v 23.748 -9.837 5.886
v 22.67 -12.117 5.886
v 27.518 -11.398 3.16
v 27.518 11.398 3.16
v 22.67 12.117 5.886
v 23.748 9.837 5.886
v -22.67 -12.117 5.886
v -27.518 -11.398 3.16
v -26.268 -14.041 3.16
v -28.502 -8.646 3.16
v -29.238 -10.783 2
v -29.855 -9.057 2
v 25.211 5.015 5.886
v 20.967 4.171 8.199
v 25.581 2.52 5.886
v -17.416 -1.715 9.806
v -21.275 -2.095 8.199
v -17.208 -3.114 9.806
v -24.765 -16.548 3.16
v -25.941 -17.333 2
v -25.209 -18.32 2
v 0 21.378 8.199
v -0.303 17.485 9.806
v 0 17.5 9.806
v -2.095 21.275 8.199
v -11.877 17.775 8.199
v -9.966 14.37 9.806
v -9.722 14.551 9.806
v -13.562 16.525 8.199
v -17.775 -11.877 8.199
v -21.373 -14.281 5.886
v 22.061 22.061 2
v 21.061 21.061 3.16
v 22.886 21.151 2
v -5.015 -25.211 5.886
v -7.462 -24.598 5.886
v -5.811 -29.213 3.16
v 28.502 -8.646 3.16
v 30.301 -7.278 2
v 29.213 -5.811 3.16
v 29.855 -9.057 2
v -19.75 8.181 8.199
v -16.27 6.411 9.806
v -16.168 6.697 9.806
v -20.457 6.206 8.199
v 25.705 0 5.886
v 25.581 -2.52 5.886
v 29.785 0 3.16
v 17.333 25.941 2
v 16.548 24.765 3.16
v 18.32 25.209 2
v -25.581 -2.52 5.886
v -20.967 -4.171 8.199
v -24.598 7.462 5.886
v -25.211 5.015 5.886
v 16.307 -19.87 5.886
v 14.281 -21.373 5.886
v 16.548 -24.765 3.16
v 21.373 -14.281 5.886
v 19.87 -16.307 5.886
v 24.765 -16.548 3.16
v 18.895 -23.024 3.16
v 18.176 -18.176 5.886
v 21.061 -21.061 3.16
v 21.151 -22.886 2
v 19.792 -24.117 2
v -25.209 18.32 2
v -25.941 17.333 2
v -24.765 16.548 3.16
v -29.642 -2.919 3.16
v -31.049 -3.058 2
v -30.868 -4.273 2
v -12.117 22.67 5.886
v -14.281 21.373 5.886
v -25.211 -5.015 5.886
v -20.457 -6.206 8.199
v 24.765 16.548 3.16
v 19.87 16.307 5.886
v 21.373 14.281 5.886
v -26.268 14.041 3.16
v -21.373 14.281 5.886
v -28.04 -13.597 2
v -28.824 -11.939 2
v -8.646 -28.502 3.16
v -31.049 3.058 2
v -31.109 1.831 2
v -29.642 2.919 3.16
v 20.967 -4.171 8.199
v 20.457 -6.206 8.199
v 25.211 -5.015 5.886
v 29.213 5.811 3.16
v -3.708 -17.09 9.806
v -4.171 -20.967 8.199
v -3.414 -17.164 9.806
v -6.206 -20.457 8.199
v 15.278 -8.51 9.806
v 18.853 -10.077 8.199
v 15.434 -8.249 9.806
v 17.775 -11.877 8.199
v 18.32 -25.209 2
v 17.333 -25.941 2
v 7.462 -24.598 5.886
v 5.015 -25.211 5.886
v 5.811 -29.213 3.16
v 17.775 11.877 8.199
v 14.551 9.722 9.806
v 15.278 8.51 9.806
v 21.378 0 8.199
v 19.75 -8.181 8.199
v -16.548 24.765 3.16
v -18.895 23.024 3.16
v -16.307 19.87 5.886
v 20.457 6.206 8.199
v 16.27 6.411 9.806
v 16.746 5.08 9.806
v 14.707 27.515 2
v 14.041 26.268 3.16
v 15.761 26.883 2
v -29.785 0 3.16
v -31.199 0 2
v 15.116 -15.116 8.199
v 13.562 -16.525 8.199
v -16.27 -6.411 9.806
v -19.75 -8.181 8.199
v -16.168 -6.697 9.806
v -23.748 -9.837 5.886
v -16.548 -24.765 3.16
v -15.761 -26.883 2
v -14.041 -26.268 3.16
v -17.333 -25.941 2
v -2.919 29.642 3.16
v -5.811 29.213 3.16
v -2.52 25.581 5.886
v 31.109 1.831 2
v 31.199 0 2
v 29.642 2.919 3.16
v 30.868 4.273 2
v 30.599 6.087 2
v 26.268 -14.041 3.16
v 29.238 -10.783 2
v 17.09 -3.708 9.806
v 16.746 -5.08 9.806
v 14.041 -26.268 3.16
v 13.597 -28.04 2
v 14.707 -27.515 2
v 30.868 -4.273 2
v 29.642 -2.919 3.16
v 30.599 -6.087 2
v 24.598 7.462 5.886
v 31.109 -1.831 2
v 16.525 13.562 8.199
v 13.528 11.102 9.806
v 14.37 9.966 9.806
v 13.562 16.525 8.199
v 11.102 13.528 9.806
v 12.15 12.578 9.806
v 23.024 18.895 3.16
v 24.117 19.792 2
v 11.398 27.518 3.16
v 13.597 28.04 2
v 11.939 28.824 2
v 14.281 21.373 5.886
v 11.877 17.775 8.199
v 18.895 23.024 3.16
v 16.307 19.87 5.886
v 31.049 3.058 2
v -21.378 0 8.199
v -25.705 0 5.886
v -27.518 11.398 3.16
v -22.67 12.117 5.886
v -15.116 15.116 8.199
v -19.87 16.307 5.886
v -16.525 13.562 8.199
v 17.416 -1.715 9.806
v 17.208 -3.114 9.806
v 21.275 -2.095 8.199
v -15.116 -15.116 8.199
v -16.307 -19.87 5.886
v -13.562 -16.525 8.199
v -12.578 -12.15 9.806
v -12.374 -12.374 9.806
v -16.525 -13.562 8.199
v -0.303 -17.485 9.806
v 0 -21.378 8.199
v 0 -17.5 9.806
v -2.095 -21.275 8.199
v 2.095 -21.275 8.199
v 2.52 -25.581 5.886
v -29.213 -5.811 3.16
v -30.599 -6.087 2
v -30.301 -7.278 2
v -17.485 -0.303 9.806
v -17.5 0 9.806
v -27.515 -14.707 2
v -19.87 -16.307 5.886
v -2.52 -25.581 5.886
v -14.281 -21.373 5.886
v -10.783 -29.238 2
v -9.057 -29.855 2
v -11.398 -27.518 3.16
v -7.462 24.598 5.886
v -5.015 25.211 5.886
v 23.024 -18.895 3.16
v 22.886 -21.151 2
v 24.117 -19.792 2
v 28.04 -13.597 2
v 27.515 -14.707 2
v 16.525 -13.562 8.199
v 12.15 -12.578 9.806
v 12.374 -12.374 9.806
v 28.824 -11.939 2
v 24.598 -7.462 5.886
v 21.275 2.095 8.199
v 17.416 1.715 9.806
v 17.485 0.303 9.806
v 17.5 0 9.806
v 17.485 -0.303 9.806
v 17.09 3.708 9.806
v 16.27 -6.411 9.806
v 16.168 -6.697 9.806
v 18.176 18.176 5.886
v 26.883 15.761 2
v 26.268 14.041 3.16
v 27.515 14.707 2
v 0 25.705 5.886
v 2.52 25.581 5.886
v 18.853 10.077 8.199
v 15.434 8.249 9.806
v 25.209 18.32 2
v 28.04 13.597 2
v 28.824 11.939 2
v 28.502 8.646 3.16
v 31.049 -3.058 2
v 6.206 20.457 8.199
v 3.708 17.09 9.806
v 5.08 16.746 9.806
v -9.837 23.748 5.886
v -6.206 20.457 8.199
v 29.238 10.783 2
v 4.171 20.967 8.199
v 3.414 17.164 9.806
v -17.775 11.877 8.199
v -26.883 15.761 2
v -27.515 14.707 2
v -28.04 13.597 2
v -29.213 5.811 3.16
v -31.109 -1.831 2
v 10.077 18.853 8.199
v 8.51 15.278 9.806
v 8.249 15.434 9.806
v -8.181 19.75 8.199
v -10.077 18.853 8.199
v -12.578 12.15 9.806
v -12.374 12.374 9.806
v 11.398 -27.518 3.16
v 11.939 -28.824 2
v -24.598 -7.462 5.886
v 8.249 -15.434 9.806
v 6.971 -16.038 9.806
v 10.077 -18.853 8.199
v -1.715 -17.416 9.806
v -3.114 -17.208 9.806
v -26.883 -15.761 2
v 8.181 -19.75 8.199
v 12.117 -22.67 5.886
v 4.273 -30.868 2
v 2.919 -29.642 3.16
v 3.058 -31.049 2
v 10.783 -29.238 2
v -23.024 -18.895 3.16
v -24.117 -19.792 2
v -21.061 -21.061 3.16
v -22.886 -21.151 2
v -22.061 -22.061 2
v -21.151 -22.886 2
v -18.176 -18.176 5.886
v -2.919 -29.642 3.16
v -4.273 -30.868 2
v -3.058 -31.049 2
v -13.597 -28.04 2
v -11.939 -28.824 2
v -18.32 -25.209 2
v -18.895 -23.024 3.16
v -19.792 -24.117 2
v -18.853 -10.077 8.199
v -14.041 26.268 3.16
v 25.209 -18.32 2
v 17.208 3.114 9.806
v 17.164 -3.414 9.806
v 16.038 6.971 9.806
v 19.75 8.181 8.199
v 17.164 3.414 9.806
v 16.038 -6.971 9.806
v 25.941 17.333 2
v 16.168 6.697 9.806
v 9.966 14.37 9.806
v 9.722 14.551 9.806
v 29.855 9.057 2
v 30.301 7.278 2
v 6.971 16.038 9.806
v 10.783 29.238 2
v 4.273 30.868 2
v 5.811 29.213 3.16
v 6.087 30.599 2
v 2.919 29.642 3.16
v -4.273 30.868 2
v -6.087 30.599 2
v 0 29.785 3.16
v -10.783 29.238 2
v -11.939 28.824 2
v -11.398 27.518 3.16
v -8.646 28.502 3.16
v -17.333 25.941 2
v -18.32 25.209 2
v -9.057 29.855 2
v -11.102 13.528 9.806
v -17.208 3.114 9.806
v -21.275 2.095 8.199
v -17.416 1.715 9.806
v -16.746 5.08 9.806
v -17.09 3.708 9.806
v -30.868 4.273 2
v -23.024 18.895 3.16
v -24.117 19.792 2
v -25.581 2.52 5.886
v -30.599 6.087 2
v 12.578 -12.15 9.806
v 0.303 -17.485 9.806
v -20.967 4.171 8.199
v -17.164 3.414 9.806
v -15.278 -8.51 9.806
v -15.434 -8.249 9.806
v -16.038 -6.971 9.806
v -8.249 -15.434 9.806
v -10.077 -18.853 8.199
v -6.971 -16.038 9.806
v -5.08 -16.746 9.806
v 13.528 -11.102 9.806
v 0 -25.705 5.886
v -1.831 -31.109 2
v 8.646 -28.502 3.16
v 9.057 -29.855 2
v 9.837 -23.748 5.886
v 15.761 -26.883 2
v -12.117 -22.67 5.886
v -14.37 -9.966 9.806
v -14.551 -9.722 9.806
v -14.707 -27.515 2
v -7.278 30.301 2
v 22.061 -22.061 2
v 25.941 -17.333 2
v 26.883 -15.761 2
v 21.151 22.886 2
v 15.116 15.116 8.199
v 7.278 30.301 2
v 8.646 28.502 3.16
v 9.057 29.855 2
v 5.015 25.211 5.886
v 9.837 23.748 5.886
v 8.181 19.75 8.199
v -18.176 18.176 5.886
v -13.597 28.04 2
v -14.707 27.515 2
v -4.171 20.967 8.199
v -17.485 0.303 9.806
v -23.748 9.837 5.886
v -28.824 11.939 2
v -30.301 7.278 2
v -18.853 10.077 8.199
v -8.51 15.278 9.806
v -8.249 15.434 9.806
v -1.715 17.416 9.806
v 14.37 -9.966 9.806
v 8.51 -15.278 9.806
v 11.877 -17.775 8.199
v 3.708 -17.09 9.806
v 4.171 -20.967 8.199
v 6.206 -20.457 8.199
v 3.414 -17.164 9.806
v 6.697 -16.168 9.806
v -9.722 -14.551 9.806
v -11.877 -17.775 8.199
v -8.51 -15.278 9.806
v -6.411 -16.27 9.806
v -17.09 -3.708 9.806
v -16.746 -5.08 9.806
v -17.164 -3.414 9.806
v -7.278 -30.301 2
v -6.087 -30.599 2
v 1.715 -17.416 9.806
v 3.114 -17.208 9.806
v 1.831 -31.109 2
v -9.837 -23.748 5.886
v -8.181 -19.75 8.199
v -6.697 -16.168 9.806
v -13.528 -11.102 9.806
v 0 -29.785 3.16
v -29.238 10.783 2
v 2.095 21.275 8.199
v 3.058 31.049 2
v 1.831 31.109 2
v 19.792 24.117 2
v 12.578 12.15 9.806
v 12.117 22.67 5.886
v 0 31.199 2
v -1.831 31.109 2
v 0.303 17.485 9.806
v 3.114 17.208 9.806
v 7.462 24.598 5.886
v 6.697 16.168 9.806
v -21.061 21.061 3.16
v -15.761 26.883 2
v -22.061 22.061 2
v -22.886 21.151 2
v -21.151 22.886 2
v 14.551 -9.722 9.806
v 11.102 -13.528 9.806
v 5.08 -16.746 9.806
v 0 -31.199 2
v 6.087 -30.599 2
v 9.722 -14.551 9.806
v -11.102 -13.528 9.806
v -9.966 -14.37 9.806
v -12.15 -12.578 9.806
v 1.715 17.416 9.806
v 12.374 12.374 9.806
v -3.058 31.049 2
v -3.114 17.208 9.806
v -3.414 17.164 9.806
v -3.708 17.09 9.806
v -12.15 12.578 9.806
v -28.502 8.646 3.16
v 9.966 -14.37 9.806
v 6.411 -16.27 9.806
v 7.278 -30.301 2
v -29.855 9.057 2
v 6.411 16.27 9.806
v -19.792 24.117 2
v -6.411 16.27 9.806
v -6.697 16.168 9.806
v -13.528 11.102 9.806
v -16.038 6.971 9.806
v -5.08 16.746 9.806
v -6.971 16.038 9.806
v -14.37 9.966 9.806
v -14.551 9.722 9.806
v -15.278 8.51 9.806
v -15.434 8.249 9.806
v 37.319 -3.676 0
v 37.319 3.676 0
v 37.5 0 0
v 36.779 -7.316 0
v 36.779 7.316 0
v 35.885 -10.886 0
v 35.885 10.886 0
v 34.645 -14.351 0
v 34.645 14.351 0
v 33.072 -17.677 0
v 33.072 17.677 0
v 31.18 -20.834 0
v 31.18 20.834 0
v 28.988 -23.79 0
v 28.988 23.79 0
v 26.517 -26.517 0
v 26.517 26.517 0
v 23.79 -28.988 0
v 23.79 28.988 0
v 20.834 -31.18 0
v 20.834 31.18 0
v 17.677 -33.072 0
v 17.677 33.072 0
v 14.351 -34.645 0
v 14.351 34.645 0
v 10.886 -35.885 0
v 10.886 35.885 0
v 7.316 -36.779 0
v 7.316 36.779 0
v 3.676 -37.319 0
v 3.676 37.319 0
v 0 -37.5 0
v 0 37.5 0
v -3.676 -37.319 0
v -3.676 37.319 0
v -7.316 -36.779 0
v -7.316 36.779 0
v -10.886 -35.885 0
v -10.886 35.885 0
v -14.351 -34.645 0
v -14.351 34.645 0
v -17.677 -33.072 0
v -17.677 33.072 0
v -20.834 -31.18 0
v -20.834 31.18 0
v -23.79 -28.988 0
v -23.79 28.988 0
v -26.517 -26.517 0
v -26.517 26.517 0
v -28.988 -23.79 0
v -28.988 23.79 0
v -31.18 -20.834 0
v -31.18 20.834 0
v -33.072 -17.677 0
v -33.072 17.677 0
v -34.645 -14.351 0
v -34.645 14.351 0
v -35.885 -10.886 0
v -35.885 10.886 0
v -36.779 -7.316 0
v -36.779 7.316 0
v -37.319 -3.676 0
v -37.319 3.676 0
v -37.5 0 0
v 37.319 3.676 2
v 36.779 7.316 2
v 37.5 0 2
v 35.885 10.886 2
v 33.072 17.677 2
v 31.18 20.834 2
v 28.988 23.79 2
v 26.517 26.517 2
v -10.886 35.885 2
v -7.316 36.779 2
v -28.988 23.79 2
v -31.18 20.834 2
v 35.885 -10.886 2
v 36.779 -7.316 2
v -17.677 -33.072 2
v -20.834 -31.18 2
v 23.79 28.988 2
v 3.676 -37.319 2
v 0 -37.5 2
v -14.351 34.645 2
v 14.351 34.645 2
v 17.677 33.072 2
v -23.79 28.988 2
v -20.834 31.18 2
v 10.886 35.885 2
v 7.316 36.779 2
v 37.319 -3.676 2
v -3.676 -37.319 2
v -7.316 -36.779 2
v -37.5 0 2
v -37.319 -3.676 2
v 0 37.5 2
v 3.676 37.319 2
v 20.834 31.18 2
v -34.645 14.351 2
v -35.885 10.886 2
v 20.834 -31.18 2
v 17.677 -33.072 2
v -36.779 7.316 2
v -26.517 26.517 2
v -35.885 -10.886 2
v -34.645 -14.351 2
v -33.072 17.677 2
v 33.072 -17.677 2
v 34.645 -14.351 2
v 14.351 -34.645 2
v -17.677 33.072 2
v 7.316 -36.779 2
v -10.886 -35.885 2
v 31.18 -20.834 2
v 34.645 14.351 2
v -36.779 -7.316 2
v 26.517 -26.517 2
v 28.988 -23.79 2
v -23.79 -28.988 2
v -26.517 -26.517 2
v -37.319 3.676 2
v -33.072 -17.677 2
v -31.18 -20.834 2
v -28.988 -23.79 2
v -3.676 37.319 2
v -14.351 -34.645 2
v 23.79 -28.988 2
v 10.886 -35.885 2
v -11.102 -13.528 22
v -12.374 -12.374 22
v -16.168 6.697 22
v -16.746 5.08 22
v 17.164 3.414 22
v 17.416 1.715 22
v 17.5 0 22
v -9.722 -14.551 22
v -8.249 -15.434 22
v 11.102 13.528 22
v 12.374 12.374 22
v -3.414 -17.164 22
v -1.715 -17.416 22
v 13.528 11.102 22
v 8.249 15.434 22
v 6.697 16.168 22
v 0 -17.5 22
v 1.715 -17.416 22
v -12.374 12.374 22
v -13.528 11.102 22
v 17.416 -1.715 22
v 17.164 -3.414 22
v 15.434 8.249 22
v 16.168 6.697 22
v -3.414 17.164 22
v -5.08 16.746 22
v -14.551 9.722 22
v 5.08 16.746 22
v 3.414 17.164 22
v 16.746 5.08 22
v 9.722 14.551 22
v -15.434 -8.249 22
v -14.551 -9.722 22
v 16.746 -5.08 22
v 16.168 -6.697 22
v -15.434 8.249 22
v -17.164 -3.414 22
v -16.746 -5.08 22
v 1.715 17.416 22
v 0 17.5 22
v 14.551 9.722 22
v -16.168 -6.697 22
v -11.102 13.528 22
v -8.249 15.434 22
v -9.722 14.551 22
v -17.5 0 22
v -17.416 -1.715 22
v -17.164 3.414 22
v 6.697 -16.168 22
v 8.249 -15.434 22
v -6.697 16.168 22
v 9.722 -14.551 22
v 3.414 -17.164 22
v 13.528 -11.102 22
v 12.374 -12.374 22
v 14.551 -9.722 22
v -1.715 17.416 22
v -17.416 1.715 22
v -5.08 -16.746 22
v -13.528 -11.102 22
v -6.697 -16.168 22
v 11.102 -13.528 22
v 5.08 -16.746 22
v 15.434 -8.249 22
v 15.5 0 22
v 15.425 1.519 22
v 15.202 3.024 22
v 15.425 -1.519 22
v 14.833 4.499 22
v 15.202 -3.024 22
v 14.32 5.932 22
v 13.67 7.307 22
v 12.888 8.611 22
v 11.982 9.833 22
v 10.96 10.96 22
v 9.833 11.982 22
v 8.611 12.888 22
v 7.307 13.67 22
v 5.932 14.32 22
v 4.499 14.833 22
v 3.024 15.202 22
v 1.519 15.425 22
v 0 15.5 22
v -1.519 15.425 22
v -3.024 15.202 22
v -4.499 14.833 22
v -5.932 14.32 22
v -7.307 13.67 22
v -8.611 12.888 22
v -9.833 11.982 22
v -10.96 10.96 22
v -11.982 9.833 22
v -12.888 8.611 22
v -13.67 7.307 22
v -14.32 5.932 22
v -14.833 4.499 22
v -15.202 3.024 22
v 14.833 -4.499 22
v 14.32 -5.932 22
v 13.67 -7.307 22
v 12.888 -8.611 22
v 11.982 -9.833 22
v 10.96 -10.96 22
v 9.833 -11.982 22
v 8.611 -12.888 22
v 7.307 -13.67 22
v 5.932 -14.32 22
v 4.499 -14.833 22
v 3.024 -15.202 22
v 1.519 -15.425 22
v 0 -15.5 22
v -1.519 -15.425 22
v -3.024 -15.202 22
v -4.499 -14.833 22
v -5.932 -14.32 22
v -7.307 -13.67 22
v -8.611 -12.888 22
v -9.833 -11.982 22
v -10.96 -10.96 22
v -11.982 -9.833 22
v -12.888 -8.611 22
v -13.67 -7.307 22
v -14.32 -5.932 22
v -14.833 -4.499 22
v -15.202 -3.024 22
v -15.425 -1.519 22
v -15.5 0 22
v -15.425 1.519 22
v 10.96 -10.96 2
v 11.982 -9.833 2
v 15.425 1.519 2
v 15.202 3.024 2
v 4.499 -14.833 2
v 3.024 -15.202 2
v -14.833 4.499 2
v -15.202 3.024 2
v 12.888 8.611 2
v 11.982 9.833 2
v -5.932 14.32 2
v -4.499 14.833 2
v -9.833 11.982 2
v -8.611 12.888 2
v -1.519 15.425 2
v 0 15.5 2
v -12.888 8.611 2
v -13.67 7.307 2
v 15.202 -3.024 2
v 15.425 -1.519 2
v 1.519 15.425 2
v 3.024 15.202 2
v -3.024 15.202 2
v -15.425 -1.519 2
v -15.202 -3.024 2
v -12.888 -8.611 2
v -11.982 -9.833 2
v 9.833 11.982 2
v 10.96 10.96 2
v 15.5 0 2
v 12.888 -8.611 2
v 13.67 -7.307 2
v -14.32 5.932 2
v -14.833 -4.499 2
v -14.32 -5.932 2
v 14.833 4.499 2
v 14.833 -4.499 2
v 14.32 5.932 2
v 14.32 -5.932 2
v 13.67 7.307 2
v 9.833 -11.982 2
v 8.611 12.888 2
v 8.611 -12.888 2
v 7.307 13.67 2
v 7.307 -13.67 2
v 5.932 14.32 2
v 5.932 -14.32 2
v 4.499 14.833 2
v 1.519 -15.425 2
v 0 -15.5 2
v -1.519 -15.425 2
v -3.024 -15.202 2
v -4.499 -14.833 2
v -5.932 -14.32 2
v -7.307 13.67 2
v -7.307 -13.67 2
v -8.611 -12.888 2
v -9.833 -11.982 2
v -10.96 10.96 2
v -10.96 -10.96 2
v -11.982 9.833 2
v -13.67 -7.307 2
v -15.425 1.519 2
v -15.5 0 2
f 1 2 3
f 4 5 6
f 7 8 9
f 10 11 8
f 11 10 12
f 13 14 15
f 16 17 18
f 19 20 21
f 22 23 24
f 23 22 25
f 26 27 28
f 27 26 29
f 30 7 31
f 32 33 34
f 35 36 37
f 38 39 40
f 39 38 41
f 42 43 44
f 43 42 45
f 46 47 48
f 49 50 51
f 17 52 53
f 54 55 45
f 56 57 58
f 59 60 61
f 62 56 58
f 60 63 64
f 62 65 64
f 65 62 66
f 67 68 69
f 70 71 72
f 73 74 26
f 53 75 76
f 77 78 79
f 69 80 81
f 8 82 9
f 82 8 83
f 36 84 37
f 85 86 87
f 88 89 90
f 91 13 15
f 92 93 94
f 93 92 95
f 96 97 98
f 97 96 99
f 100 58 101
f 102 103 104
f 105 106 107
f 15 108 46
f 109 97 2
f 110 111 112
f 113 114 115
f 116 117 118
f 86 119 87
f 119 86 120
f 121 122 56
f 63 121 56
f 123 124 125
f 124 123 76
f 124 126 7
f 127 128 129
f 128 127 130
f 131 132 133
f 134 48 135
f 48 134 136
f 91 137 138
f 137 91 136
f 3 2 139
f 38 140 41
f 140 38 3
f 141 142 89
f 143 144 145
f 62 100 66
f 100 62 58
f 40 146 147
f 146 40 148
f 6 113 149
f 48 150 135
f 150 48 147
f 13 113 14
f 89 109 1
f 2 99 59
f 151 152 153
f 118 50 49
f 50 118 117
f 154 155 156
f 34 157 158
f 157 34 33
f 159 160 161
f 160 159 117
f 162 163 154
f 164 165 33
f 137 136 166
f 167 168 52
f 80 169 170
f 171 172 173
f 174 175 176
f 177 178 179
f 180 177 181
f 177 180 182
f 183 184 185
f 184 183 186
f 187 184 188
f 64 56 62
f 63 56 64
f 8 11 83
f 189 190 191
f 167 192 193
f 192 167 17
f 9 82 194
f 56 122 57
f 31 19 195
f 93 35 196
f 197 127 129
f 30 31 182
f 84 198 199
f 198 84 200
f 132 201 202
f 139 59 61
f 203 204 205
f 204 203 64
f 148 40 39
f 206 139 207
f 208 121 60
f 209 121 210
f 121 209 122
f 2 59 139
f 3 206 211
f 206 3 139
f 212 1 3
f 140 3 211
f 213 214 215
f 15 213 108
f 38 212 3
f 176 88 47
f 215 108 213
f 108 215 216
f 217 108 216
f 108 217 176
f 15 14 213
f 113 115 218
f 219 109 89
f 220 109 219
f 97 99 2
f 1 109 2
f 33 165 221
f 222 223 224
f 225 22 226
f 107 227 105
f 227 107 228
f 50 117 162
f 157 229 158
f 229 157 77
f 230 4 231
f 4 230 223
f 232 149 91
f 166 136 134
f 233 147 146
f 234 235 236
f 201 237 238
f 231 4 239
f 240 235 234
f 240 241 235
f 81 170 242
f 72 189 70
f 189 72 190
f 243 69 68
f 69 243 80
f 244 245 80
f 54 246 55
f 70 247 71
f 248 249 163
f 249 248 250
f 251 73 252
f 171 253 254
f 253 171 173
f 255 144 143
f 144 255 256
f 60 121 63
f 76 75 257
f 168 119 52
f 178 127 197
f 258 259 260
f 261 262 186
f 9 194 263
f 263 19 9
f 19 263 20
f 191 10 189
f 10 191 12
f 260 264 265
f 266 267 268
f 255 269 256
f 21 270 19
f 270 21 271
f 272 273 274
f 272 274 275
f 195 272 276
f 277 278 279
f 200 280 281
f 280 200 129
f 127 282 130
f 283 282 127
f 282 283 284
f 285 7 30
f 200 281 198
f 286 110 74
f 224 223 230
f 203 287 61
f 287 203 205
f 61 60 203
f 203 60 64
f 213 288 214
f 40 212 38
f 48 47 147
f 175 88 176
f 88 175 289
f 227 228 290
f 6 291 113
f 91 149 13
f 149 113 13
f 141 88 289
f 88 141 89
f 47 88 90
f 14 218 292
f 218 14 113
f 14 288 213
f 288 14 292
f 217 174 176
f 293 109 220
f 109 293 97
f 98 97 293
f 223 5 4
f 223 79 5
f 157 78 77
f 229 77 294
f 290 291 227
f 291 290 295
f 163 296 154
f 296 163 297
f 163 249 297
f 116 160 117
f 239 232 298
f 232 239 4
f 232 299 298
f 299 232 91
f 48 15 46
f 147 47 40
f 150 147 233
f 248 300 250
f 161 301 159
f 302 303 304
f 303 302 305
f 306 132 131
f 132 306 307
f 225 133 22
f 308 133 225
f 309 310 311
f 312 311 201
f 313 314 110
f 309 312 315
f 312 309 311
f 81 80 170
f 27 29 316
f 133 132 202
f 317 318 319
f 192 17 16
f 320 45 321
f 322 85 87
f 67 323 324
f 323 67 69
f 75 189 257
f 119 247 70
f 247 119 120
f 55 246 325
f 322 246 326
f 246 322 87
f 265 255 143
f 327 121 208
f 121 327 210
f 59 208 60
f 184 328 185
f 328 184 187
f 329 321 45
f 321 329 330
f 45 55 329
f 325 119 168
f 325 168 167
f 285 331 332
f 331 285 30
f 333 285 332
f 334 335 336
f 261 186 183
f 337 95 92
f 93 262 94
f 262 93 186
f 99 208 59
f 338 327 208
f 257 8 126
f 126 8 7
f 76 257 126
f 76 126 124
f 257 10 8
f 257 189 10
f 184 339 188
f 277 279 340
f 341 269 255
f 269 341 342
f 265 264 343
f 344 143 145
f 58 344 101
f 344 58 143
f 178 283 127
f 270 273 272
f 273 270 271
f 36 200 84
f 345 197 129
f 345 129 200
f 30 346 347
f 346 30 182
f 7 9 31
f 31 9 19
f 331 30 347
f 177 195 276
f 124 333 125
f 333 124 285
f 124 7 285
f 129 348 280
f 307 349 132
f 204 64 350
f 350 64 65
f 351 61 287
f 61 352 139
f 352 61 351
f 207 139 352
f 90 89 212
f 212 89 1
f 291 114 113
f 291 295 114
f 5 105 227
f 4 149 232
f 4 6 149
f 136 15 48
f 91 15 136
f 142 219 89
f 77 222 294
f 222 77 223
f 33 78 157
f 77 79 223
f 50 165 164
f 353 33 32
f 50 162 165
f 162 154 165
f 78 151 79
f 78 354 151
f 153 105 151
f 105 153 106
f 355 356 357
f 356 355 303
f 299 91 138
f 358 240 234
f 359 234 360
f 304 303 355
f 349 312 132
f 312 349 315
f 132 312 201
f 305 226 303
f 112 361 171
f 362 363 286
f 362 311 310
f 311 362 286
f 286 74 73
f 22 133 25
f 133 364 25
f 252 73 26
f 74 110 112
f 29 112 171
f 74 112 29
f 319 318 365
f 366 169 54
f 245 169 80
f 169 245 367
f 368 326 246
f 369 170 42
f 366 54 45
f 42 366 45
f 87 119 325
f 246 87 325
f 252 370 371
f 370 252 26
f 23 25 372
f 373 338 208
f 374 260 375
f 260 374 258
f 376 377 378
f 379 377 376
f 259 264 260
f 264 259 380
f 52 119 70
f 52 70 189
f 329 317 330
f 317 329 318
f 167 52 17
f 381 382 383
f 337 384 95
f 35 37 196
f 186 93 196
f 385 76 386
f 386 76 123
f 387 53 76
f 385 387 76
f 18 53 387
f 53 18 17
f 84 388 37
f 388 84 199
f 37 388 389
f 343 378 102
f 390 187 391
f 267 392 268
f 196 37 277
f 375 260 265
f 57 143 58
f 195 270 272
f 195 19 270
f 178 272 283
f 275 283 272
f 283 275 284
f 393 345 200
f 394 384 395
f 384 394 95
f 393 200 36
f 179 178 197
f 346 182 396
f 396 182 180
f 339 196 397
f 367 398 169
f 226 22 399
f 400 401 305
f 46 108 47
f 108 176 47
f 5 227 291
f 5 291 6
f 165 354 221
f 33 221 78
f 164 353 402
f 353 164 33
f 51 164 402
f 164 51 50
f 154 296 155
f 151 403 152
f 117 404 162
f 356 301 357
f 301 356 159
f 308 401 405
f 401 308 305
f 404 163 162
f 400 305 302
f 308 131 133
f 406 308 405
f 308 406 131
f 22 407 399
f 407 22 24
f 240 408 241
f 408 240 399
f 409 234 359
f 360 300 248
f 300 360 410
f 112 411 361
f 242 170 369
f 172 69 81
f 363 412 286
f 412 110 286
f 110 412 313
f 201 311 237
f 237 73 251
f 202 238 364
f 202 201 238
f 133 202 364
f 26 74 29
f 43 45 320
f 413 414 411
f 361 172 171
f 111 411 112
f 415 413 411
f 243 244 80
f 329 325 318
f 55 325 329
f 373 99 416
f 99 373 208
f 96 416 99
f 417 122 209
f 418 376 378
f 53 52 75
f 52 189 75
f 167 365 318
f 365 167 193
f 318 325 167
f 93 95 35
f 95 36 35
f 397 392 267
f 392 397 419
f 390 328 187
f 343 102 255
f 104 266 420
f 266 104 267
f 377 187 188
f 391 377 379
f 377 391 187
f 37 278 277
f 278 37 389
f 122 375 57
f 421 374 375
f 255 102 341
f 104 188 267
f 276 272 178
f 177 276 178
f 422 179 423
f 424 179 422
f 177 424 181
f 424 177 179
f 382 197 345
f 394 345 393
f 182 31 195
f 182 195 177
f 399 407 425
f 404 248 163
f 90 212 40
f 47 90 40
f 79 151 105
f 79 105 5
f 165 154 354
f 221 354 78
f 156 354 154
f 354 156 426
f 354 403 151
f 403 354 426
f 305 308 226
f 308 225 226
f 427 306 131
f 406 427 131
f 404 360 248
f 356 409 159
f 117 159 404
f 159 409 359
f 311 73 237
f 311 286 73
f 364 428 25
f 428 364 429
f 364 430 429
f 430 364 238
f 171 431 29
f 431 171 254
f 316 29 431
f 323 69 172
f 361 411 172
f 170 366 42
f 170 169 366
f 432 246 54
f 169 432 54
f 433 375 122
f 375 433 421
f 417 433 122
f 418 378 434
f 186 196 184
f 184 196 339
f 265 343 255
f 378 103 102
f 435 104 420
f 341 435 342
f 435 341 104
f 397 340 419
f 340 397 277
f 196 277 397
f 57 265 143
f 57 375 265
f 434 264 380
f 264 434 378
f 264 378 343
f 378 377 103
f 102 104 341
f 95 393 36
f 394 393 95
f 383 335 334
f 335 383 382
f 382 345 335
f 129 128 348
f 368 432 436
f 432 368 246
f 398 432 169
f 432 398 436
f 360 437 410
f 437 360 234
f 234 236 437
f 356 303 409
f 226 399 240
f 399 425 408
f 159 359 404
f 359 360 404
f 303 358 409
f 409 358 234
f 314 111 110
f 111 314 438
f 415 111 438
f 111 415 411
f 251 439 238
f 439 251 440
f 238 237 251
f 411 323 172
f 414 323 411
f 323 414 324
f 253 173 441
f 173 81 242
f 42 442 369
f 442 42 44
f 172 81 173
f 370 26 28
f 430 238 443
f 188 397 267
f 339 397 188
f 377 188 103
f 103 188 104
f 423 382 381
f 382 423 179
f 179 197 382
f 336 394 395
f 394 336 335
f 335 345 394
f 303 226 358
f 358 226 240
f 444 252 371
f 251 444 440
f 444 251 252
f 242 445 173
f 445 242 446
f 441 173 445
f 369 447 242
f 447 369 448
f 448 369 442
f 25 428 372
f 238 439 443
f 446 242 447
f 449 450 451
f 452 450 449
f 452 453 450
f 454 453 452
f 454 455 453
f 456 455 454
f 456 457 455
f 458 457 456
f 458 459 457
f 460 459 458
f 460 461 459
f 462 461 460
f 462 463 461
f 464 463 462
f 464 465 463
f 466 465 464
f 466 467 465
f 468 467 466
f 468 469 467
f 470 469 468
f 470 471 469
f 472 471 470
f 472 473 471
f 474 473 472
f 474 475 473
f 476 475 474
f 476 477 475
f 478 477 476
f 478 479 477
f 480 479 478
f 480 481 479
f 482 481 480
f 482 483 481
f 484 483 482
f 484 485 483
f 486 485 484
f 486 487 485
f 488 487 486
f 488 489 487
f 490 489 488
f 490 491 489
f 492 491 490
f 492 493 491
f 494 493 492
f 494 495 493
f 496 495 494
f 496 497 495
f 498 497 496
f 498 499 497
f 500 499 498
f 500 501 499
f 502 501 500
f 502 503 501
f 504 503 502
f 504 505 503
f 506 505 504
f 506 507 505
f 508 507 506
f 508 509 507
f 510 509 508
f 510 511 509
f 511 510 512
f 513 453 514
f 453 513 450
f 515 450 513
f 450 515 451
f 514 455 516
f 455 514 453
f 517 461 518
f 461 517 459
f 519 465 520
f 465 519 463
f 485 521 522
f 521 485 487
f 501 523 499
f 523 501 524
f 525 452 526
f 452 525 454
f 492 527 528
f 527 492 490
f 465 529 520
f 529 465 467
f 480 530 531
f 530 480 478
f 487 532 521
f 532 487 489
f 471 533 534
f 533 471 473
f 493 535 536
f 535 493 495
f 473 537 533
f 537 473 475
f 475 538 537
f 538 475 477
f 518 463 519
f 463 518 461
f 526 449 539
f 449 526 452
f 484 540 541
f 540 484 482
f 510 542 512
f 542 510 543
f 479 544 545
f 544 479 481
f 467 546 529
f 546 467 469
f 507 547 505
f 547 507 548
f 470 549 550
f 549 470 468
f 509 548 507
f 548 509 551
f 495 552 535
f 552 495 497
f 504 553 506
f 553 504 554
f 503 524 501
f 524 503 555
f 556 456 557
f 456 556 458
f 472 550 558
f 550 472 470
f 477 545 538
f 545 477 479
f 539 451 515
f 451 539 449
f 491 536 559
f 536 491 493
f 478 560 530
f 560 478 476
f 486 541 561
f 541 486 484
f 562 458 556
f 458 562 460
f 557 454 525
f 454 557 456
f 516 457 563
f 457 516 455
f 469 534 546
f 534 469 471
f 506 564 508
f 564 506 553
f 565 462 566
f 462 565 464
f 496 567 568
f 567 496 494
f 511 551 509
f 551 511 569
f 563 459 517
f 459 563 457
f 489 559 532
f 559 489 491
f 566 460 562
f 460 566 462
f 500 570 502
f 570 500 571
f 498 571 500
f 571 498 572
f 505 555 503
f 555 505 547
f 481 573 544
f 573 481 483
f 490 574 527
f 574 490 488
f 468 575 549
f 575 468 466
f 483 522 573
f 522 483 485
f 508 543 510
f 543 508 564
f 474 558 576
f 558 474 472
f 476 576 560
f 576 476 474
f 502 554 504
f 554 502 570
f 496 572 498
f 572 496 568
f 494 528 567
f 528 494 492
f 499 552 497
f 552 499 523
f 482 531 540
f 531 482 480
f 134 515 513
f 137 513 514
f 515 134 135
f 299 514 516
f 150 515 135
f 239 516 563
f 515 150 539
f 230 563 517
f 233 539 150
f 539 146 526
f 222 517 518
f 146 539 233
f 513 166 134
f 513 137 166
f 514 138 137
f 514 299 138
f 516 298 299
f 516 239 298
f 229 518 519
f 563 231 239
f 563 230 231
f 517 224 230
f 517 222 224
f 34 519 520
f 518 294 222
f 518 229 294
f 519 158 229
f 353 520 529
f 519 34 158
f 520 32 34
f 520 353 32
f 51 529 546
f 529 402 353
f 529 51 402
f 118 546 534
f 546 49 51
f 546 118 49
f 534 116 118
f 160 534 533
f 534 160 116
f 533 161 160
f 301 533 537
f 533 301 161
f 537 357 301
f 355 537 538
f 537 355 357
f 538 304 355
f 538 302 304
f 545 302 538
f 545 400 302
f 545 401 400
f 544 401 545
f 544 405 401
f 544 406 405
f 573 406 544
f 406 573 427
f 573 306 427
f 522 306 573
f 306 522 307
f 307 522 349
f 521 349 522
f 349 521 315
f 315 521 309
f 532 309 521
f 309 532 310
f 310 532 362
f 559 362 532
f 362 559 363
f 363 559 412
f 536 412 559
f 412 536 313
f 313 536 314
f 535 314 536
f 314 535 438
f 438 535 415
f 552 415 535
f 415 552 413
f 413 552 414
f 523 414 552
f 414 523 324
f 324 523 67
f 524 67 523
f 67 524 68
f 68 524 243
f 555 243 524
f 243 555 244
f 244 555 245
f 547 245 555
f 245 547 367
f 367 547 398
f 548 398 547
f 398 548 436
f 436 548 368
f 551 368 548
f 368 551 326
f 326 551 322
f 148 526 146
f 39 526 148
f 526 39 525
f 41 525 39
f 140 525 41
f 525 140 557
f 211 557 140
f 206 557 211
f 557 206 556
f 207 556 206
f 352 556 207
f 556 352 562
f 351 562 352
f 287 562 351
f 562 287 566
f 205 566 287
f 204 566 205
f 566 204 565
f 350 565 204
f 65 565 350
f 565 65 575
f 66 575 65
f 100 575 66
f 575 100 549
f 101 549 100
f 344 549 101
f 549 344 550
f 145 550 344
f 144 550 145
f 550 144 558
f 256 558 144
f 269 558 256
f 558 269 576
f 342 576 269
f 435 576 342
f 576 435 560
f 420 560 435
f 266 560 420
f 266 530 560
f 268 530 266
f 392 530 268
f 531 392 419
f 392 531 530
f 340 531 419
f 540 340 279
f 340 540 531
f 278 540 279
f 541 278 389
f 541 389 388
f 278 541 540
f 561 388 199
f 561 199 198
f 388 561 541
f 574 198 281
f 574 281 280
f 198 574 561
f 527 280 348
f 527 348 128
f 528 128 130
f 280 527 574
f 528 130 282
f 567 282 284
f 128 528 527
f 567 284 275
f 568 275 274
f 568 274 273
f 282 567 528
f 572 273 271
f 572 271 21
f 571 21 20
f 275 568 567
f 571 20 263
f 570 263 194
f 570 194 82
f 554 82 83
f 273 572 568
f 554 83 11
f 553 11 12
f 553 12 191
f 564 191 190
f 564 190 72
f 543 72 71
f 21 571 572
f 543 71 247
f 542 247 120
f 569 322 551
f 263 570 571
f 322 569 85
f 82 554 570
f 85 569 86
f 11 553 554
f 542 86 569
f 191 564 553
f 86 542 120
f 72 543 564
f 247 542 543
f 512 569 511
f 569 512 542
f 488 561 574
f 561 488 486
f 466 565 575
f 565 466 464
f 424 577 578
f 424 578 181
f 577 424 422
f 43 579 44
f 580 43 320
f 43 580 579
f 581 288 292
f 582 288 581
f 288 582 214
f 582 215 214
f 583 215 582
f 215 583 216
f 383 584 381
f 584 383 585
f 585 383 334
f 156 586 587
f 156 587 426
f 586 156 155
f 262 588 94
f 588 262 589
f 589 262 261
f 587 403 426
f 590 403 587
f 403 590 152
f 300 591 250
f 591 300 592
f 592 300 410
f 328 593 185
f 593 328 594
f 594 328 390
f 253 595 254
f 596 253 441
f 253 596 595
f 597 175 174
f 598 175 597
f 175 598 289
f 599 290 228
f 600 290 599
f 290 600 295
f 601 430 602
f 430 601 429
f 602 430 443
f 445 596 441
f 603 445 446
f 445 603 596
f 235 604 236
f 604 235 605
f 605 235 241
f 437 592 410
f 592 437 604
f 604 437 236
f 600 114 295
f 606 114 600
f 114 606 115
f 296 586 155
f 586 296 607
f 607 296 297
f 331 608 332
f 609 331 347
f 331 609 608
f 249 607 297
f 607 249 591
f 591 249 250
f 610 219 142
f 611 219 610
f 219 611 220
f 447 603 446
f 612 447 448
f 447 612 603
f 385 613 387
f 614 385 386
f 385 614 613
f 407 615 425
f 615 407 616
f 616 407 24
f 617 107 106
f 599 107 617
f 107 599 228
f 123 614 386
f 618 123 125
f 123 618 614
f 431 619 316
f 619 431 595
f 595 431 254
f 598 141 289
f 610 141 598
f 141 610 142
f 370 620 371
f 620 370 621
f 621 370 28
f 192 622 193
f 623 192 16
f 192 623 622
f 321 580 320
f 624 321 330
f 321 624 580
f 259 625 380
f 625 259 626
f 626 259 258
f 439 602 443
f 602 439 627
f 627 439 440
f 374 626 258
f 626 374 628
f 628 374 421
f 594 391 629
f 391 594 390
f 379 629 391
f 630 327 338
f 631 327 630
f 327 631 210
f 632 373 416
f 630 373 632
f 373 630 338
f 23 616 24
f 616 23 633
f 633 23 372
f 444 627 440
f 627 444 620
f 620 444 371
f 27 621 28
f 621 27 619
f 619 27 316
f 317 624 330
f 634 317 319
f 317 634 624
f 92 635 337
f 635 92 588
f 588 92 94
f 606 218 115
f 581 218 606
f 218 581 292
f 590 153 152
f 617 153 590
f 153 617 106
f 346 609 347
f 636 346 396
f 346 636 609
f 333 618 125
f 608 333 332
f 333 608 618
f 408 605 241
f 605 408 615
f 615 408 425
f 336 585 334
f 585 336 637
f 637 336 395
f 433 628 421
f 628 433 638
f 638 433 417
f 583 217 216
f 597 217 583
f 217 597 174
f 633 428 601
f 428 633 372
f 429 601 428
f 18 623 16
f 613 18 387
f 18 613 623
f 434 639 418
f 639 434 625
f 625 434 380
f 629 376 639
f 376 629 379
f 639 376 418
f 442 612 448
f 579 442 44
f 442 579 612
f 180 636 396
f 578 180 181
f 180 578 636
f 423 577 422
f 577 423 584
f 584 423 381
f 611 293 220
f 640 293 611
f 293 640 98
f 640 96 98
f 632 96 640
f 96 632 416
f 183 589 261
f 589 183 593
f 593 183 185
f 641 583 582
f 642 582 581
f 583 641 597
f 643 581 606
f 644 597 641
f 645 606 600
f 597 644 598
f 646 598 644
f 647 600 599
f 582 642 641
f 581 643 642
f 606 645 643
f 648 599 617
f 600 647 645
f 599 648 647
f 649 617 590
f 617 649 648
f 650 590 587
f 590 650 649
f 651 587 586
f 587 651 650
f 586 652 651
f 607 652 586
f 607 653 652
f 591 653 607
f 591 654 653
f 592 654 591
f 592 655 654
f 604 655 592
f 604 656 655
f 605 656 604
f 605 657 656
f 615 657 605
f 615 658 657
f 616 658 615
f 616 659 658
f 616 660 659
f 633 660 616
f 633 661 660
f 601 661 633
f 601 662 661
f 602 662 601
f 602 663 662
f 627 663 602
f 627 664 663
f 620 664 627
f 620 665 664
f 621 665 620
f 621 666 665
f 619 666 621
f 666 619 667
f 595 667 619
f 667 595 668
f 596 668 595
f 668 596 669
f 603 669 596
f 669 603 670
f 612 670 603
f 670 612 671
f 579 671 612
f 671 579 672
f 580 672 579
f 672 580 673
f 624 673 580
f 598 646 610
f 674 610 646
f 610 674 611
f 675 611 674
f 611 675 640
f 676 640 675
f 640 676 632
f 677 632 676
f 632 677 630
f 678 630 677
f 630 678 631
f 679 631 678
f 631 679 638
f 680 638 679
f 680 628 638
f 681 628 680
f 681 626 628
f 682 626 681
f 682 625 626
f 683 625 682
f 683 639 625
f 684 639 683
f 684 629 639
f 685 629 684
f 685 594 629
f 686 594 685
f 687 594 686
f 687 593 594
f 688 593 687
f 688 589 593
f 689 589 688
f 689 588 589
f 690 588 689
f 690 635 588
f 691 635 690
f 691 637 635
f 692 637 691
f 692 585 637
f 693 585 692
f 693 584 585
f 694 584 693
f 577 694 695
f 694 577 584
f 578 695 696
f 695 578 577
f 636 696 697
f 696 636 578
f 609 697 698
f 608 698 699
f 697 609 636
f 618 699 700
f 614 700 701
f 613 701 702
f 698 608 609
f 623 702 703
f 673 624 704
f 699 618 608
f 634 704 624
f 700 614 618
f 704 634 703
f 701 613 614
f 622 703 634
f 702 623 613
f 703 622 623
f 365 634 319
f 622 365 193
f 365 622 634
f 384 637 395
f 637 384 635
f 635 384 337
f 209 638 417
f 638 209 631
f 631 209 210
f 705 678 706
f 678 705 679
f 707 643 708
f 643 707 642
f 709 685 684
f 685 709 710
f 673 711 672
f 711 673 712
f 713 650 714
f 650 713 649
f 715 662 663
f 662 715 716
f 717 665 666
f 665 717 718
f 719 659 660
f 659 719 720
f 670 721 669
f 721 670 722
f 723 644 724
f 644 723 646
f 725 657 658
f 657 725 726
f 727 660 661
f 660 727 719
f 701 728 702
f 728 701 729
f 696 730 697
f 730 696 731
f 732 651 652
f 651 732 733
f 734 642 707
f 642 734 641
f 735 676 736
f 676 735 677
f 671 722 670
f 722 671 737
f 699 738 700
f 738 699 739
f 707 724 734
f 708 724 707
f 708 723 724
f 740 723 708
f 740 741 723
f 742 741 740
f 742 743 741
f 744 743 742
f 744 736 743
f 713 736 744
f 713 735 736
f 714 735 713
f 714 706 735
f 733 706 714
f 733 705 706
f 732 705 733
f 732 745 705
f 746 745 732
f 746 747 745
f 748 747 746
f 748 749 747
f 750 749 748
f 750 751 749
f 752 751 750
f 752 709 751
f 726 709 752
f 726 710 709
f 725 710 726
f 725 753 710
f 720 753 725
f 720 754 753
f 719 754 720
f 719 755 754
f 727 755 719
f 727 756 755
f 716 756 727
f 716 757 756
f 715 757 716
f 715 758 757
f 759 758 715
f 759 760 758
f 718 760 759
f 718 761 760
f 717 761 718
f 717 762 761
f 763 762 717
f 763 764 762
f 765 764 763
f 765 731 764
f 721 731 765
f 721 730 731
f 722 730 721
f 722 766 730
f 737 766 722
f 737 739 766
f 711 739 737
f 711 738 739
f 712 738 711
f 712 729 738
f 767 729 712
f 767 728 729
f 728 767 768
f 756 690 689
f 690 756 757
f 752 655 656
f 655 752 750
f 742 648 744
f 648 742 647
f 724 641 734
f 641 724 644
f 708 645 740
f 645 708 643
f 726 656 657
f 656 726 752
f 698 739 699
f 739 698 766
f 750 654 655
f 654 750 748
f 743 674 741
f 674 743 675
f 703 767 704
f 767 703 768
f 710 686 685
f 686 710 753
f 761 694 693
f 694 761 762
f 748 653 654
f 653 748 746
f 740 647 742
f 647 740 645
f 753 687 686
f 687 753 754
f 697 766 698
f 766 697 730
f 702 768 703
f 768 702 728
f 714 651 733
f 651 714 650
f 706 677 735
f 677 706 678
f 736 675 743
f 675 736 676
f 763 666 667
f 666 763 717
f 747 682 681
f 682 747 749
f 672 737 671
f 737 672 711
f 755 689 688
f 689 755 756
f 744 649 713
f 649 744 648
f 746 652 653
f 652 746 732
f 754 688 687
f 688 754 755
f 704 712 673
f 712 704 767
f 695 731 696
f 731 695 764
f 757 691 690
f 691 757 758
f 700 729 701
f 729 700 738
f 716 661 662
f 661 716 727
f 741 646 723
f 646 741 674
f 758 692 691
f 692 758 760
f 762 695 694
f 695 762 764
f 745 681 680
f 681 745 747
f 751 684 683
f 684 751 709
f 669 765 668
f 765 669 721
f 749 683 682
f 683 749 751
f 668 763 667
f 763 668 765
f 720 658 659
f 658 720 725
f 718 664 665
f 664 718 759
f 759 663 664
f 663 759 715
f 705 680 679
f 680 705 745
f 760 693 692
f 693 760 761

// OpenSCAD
// http://www.thingiverse.com/thing:1445822

base_thickness = 2.0;
base_diameter = 75.0;

post_idiameter = 31.0;
post_height = 20.0;
post_thickness = 2.0;

dome_diameter = 100;
dome_height = 13;

$fn = 64;

module base() {
   cylinder(d=base_diameter, h=base_thickness);
}

module post() {
    cylinder(d=post_idiameter+post_thickness*2, h=post_height+base_thickness);
}

module dome() {
    difference() {
        translate([0,0,-dome_diameter/2+dome_height]) sphere(d=dome_diameter);
        translate([-dome_diameter/2,-dome_diameter/2,-dome_diameter]) cube([dome_diameter,dome_diameter,dome_diameter]);
    }
}

module body() {

    union() {
        base();
        dome();
        post();
    }
}

// cutout the post hole
difference() {
    body();
    translate([0,0,base_thickness]) cylinder(d=post_idiameter, h=post_height*2);

}
